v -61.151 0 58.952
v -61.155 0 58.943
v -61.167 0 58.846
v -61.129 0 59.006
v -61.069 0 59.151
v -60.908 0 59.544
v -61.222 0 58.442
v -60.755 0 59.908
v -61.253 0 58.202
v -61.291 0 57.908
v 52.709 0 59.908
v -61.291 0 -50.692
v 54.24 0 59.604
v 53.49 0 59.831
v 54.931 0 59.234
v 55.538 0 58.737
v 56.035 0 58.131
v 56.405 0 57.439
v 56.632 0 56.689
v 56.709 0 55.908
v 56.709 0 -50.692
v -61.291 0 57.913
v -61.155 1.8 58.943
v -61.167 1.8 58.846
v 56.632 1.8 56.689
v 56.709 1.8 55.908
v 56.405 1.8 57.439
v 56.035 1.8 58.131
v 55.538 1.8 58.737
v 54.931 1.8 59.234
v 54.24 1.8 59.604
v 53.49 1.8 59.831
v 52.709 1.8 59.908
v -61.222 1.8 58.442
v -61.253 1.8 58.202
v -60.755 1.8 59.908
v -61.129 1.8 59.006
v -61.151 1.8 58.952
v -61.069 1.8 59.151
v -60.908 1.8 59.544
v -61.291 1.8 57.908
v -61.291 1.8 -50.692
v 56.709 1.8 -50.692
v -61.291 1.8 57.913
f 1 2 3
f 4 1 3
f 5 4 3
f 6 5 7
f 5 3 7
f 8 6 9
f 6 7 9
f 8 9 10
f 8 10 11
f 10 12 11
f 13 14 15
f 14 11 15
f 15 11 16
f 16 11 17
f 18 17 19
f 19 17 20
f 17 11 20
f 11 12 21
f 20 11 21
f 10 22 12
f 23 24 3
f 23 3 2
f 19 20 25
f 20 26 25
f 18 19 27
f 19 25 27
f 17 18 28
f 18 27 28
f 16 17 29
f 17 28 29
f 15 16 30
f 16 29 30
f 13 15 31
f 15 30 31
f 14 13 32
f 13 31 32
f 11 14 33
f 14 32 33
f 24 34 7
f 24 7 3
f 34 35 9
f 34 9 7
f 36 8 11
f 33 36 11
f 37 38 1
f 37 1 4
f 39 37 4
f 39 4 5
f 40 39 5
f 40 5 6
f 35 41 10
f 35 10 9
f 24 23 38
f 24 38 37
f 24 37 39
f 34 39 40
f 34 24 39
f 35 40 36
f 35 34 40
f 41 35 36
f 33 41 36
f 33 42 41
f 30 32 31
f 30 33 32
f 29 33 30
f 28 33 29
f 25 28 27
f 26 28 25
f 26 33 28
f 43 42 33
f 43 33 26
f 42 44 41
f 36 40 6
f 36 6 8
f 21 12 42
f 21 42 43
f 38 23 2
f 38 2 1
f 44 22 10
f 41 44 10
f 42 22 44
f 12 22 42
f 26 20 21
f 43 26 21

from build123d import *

# Parameters (mm, degrees)
SKETCH_1_W          = 118
SKETCH_1_H          = 110.6
EXTRUDE_1_DEPTH     = 1.8
CUT_EXTRUDE_1_DEPTH = 86.725227637
FILLET_1_R          = 4


with BuildPart() as part:
    # Эскиз1 → Бобышка-Вытянуть1 (new body)
    with BuildSketch(Plane(origin=(0, 0, 0), x_dir=(1, 0, 0), z_dir=(0, 1, 0))):
        with Locations((-2.290833333, -4.608333333)):
            Rectangle(SKETCH_1_W, SKETCH_1_H)
    extrude(amount=EXTRUDE_1_DEPTH)

    # Эскиз2 → Вырез-Вытянуть1 (cut, through all)
    with BuildSketch(Plane(origin=(0, 1.8, 0), x_dir=(1, 0, 0), z_dir=(0, 1, 0))):
        Polygon((-60.751506463, -59.916396196), (-61.297229463, -59.916396196), (-61.290819216, -57.908253599), (-61.253093448, -58.202342018), (-61.222338592, -58.4420892), (-61.167479406, -58.845558834), (-61.154637964, -58.943098844), (-61.150921997, -58.952139891), (-61.128591446, -59.006470711), (-61.069391255, -59.150506338), (-60.907702538, -59.543899251), align=None)
    extrude(amount=-CUT_EXTRUDE_1_DEPTH, mode=Mode.SUBTRACT)

    # Скругление1
    fillet_1_edges = [part.edges().sort_by_distance(p)[0] for p in [
        (56.709166667, 0.9, 59.908333333),
    ]]
    fillet(fillet_1_edges, radius=FILLET_1_R)


solid = part.part
